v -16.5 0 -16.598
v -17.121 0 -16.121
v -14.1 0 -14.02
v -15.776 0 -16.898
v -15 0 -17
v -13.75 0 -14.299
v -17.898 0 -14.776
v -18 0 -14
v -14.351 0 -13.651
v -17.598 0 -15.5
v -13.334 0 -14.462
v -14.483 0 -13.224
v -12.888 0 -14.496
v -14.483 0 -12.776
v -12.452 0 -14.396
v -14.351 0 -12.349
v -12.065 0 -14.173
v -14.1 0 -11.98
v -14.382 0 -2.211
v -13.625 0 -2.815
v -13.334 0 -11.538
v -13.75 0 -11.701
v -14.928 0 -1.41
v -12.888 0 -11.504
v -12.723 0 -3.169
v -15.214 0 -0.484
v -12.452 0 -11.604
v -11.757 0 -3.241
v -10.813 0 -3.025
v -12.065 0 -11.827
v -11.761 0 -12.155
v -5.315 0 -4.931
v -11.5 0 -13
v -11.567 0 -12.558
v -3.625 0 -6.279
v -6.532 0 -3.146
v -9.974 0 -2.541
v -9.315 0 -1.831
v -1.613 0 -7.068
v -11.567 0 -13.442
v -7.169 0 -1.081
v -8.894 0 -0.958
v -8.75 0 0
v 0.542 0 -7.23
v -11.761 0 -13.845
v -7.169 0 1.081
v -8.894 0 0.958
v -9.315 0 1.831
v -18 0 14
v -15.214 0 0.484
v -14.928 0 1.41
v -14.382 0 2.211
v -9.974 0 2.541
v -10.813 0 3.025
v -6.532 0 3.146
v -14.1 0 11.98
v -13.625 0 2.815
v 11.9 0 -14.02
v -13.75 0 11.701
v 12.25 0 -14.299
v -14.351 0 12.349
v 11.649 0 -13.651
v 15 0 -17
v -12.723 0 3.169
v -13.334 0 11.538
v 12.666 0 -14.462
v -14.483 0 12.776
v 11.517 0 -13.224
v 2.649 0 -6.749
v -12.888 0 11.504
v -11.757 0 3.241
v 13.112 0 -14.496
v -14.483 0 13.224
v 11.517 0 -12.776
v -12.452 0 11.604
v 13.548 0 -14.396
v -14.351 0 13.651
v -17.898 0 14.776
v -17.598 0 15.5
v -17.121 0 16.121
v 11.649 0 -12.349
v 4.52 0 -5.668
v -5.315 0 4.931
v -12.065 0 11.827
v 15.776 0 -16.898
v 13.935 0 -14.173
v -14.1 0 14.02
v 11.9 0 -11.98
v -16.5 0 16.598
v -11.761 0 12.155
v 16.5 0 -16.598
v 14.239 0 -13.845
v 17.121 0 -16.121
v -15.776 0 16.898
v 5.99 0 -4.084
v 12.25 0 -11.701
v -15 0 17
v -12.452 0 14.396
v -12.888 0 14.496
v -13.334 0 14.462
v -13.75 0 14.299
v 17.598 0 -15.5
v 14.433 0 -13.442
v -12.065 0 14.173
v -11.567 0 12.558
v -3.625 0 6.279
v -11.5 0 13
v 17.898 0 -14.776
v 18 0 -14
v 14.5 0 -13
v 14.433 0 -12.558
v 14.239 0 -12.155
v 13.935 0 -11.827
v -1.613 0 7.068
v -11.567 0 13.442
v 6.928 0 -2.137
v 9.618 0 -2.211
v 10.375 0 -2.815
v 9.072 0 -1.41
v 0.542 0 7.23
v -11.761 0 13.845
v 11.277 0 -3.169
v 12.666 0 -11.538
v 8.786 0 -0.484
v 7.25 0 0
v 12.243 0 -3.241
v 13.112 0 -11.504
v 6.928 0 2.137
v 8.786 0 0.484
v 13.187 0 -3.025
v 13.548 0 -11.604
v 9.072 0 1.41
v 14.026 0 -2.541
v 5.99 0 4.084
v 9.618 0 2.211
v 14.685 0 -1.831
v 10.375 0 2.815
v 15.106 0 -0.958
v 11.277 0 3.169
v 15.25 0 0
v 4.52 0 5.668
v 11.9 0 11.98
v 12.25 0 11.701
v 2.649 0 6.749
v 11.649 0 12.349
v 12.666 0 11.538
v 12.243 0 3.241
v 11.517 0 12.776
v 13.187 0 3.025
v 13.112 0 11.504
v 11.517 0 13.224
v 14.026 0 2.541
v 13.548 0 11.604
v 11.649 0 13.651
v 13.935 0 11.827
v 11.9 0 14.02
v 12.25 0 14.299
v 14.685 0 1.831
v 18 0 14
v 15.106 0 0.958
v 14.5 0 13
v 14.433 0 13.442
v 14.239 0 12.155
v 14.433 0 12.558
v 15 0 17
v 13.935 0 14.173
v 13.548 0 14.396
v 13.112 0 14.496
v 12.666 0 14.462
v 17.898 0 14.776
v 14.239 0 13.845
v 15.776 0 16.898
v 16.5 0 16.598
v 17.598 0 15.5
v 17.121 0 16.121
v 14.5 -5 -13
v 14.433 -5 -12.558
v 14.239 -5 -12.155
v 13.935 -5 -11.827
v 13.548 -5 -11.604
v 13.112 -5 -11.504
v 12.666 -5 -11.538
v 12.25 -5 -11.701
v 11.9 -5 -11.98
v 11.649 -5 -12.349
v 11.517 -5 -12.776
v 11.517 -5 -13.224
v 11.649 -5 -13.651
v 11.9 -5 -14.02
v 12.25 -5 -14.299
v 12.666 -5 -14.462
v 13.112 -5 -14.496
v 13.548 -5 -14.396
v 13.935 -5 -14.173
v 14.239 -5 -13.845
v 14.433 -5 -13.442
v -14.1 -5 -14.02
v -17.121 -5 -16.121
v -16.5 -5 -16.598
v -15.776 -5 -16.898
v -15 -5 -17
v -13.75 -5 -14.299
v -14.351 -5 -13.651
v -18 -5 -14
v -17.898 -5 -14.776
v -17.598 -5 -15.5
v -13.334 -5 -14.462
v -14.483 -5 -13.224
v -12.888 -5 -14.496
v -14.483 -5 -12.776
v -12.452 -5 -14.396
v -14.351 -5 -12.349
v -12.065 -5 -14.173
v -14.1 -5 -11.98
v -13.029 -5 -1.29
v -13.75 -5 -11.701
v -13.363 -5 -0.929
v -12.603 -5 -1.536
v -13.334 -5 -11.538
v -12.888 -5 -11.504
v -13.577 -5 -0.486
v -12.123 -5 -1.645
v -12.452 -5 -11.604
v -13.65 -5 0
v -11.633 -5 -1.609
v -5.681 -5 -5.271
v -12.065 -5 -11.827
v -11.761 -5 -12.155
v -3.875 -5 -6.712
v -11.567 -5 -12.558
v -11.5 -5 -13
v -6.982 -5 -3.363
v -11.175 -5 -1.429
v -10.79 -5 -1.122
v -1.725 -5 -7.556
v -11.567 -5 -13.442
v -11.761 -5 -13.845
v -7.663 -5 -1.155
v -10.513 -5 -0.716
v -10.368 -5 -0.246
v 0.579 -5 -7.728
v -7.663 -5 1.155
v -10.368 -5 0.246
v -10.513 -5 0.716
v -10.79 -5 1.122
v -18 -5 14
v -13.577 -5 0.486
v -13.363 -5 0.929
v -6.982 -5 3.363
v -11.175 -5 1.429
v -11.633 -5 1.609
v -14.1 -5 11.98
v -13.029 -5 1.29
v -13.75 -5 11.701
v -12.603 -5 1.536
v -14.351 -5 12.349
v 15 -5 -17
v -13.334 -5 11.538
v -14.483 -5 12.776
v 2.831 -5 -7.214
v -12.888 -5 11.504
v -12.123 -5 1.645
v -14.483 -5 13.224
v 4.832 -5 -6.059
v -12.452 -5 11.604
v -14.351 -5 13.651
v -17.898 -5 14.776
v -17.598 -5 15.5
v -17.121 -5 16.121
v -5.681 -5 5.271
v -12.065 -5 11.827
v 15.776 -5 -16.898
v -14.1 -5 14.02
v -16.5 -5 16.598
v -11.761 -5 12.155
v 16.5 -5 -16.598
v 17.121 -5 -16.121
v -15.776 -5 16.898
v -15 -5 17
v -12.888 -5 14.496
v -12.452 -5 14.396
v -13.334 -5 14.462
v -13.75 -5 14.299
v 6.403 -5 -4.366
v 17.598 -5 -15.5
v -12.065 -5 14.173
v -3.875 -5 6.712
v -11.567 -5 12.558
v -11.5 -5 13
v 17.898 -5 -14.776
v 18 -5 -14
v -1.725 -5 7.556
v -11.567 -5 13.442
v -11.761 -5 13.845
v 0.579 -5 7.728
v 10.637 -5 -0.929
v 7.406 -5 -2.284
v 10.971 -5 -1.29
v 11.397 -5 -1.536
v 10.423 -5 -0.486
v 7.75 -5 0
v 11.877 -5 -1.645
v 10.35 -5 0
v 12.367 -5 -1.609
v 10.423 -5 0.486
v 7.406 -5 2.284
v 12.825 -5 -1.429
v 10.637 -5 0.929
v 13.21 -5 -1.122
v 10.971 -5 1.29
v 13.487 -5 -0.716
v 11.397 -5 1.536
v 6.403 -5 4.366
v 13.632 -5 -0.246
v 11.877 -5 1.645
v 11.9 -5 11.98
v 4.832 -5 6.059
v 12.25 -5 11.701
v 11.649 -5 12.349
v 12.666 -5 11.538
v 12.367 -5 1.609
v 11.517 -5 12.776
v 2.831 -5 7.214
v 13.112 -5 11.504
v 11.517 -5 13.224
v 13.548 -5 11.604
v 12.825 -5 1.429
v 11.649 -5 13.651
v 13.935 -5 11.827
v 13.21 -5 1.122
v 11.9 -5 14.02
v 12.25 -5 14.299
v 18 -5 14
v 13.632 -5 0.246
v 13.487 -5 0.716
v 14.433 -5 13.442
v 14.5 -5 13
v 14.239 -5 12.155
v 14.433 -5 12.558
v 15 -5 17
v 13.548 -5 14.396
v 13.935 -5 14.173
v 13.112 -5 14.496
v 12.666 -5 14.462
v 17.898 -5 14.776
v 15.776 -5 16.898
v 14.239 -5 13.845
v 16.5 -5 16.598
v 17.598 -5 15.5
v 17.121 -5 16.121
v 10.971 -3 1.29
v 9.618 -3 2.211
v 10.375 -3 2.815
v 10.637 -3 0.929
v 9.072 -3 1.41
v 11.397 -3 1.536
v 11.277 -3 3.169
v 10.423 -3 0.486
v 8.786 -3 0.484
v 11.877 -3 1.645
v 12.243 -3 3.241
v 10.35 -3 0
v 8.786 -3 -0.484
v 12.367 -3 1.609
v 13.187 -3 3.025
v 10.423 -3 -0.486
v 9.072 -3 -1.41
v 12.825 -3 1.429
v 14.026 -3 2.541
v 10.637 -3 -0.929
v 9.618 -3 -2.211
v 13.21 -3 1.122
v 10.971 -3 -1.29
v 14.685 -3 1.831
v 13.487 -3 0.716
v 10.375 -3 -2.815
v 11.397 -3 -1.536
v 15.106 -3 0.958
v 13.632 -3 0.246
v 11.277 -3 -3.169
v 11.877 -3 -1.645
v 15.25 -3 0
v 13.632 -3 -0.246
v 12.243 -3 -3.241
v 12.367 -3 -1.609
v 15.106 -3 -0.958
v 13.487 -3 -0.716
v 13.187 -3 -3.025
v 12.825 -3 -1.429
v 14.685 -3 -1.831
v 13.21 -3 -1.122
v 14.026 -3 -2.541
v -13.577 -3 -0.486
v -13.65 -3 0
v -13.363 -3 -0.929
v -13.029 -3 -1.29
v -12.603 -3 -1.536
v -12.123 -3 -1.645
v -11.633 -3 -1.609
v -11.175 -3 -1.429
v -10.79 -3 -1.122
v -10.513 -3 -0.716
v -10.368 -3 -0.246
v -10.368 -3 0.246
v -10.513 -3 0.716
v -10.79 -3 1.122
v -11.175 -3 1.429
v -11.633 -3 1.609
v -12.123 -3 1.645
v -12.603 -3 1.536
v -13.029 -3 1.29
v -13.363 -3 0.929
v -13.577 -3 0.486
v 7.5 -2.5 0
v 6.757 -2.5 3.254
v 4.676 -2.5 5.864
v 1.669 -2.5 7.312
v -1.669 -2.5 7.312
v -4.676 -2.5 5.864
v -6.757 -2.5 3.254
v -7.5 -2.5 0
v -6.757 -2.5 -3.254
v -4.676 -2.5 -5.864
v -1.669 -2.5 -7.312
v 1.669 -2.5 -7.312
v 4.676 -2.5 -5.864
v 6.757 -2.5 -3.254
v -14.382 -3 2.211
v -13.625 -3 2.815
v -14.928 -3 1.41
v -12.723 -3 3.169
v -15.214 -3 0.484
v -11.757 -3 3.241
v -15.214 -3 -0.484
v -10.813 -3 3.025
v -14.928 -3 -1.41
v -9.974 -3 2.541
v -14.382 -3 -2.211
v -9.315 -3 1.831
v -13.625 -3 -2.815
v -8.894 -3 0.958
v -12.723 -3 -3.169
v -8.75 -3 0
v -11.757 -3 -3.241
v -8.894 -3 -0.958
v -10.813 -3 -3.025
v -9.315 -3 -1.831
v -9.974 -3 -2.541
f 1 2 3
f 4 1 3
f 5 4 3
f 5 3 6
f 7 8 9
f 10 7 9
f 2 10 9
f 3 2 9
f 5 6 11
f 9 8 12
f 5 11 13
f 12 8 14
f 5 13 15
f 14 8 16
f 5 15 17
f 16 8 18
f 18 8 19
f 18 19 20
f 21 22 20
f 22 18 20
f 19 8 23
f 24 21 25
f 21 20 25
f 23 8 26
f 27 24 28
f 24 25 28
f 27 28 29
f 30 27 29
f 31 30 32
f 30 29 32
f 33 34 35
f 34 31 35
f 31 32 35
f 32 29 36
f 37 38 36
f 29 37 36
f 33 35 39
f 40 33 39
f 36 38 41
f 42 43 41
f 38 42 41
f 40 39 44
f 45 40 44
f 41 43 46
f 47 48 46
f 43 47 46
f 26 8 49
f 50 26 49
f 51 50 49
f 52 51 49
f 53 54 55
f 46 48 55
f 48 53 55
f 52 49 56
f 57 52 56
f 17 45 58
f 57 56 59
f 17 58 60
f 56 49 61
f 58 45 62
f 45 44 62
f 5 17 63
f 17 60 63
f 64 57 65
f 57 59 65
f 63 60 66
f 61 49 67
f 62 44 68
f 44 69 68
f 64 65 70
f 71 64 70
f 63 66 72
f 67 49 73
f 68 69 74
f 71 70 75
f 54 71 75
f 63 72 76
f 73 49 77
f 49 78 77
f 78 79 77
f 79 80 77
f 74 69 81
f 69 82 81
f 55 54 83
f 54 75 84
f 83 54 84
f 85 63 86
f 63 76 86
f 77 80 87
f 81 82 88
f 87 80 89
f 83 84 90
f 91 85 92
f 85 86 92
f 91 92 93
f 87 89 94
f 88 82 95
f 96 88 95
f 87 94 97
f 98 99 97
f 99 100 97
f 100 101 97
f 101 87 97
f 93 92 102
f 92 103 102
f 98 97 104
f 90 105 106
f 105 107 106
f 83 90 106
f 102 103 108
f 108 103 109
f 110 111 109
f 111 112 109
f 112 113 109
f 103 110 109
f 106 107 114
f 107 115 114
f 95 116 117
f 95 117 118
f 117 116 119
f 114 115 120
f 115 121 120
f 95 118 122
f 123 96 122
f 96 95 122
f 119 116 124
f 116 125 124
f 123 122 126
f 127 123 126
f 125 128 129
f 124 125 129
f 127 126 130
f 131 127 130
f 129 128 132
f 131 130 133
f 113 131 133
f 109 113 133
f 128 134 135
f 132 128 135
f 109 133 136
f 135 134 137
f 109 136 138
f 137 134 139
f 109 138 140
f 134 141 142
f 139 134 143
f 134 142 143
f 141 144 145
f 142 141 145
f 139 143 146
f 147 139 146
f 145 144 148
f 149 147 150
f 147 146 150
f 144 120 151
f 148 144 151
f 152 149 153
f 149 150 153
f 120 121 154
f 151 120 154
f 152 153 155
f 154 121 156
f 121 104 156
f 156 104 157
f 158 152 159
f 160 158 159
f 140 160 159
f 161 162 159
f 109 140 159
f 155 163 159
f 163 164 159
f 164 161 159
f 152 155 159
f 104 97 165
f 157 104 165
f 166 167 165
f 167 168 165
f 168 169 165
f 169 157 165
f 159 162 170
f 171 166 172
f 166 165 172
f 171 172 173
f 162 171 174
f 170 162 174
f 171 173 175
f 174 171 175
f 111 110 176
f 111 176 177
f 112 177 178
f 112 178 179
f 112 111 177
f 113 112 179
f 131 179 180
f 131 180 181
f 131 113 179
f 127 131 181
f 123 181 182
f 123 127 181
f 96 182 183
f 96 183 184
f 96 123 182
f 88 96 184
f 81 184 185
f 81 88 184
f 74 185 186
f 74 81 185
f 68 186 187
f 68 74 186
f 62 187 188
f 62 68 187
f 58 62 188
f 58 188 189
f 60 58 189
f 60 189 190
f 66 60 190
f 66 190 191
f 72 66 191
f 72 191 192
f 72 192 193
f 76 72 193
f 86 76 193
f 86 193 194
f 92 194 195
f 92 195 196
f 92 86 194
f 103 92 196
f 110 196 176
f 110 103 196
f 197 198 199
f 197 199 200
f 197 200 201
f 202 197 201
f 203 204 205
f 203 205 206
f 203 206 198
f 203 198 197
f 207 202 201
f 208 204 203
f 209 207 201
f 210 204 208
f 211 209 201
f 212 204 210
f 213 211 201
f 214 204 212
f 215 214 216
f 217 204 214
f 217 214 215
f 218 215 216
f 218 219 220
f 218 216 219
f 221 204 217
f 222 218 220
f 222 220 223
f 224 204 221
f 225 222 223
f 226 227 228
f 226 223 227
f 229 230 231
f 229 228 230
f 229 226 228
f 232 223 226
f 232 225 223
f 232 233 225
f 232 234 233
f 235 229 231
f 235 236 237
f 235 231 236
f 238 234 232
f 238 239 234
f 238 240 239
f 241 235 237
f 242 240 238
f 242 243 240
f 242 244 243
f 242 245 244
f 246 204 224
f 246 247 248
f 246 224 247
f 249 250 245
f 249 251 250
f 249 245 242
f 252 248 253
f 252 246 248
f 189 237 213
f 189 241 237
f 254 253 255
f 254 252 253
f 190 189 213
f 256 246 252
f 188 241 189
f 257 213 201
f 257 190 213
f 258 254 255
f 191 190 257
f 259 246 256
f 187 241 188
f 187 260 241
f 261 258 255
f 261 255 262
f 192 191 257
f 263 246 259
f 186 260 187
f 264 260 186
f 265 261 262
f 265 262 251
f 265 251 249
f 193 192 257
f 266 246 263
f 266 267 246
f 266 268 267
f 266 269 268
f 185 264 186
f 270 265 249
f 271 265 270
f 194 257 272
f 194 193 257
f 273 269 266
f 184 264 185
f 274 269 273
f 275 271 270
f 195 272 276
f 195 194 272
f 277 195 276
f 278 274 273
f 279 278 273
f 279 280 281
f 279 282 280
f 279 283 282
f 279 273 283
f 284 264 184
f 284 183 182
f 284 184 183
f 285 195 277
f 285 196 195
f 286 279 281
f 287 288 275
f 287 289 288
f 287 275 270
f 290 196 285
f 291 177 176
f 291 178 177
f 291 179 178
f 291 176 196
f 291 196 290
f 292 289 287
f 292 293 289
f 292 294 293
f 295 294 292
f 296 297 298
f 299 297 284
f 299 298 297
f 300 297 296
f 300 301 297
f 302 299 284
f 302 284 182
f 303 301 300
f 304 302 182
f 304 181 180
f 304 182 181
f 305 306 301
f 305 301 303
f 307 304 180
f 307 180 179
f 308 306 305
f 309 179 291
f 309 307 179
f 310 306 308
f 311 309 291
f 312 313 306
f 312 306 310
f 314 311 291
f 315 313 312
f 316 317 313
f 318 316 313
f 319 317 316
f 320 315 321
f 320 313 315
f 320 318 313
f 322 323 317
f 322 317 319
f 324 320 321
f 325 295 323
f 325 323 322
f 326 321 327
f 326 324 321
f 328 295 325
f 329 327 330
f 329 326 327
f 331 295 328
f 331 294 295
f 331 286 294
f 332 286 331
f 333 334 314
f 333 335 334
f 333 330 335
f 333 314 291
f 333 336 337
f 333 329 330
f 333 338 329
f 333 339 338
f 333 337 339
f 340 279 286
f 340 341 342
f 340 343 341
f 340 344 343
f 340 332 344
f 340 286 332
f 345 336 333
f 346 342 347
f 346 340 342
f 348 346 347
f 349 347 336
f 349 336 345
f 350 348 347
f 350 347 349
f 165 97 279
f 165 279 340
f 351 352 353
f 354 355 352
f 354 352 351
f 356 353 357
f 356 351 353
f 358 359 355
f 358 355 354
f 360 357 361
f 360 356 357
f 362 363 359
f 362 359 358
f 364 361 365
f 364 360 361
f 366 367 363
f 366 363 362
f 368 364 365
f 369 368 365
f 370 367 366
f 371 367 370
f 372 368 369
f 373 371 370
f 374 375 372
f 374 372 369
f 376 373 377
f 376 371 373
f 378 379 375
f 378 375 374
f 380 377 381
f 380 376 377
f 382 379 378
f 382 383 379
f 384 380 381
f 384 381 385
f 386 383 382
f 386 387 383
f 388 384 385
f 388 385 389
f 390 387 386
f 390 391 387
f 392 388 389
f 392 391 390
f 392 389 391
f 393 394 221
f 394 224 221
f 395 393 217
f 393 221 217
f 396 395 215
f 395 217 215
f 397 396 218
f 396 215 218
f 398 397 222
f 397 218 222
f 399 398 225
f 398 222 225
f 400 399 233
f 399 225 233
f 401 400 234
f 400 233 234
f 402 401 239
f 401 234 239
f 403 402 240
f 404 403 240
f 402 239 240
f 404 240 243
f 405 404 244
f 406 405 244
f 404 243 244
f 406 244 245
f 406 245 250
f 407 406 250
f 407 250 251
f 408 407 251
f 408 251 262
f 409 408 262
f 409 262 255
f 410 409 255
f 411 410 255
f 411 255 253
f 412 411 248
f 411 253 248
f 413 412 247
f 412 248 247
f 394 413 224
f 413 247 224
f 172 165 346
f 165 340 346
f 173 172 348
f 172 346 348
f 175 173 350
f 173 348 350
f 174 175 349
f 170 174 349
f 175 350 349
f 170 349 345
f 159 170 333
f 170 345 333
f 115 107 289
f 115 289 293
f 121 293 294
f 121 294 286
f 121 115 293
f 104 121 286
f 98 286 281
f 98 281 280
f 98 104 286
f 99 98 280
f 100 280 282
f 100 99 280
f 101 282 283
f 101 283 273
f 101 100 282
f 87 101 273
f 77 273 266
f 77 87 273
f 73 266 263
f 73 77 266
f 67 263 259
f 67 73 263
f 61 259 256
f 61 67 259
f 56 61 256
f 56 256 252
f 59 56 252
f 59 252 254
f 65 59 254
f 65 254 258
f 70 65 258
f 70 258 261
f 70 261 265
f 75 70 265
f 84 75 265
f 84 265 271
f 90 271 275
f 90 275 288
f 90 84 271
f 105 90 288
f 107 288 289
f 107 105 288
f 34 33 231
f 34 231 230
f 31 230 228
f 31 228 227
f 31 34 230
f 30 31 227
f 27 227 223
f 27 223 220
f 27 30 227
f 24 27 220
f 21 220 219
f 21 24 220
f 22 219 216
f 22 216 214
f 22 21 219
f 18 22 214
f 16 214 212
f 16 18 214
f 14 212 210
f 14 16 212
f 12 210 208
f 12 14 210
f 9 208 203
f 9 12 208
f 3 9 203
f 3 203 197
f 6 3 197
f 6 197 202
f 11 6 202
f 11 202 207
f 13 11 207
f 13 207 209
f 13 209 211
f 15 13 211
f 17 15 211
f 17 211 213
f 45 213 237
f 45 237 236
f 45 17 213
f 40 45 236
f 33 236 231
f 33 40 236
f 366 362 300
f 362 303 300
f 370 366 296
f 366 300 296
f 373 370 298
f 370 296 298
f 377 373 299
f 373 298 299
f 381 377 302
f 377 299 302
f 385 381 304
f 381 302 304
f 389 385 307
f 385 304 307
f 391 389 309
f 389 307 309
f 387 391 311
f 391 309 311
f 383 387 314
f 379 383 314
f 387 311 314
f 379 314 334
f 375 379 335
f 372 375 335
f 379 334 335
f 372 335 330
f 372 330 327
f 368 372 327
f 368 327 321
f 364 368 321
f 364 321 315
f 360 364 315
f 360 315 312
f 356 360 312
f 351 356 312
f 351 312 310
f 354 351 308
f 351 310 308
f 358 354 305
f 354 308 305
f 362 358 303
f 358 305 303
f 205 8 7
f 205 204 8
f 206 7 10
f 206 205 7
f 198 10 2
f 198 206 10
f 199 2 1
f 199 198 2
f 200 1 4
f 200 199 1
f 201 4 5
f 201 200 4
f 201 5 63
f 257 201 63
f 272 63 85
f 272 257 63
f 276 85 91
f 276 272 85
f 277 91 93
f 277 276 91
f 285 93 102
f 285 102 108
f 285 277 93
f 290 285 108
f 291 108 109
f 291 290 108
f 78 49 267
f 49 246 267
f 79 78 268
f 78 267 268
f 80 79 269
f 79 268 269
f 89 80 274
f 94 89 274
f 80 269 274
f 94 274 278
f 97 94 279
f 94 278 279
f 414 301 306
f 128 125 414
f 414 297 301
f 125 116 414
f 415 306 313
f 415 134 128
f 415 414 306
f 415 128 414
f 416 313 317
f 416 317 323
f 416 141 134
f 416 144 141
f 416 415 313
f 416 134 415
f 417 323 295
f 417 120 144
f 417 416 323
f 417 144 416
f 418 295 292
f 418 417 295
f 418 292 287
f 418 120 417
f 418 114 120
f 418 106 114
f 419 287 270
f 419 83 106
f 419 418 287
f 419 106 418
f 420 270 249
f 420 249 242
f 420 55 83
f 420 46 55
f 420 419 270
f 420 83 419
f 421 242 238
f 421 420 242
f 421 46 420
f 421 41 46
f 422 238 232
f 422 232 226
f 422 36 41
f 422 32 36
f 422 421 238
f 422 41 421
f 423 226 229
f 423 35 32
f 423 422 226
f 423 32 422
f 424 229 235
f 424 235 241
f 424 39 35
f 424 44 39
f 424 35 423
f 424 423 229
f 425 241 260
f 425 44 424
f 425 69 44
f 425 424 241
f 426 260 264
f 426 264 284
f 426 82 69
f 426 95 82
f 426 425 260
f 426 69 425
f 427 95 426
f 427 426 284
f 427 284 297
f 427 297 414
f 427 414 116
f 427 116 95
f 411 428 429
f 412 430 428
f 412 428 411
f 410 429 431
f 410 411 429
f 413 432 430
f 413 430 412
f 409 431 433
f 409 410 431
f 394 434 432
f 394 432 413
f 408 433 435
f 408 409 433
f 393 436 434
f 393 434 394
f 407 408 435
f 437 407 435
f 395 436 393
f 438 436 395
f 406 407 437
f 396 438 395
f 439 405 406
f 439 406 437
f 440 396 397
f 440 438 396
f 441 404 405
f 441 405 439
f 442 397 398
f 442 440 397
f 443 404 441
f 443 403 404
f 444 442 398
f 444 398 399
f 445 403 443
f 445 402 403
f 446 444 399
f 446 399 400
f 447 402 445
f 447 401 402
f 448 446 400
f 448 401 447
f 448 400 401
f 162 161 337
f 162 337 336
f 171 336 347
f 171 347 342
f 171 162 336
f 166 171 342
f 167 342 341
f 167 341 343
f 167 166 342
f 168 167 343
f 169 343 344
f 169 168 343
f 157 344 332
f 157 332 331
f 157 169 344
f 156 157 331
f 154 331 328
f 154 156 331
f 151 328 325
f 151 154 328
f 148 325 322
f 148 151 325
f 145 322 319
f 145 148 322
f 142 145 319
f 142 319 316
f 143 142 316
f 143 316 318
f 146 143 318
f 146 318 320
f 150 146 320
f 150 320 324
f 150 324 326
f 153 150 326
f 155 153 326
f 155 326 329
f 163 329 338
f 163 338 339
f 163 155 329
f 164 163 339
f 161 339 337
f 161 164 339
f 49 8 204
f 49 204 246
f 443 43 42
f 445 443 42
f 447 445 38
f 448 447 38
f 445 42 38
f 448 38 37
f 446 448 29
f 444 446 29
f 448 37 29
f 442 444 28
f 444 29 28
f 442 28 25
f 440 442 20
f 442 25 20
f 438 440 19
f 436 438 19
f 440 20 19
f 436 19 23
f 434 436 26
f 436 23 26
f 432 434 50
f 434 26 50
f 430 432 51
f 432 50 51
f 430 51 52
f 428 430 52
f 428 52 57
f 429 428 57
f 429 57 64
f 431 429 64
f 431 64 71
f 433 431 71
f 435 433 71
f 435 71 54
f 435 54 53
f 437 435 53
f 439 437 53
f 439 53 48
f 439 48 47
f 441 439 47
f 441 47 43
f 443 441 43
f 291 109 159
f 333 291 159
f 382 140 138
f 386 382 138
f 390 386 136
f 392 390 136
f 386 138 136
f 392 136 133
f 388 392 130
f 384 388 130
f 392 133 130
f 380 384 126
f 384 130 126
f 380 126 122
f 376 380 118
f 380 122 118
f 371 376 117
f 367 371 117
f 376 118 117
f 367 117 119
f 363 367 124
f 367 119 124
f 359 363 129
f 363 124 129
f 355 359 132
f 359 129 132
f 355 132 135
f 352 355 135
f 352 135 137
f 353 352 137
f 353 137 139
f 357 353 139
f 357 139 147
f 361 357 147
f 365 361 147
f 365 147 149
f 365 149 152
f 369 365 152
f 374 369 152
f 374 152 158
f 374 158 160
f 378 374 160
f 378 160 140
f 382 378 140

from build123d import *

# Parameters (mm, degrees)
F0_W           = 36
F0_H           = 34
F0_R           = 1.5
F0_R_2         = 7.25
F1_DEPTH       = 5
F2_R           = 3
F3_SIZE2       = 4.99999
F3_SIZE        = 0.49999
F4_D           = 3.3
F4_CBORE_D     = 6.5
F4_CBORE_DEPTH = 3


# Not quite as in the source:
# - a fillet or chamfer is up to 0.001 mm smaller than in the source, because OpenCascade refuses the exact size


with BuildPart() as f1:
    # F0 (on Front) → F1 (new body)
    with BuildSketch(Plane.XZ):
        Rectangle(F0_W, F0_H)
        with Locations((-13, -13)):
            Circle(F0_R, mode=Mode.SUBTRACT)
        with Locations((13, -13)):
            Circle(F0_R, mode=Mode.SUBTRACT)
        with Locations((-13, 13)):
            Circle(F0_R, mode=Mode.SUBTRACT)
        Circle(F0_R_2, mode=Mode.SUBTRACT)
        with Locations((13, 13)):
            Circle(F0_R, mode=Mode.SUBTRACT)
    extrude(amount=F1_DEPTH)

    # F2
    f2_edges = [f1.edges().sort_by_distance(p)[0] for p in [
        (-18, -2.5, 17),
        (18, -2.5, 17),
        (18, -2.5, -17),
        (-18, -2.5, -17),
    ]]
    fillet(f2_edges, radius=F2_R)

    # F3 (size 0.5 and 5 in the source; OpenCascade refuses exactly that, so slightly less here)
    f3_edges = [f1.edges().sort_by_distance(p)[0] for p in [
        (-7.25, -5, 0),
    ]]
    f3_side = f1.faces().sort_by_distance((0, -5, -16.504823))[0]
    chamfer(f3_edges, length=F3_SIZE, length2=F3_SIZE2, reference=f3_side)

    # F4 (through all)
    with Locations(Plane(origin=(0, 0, 0), x_dir=(1, 0, 0), z_dir=(0, 1, 0))):
        with Locations((12, 0), (-12, 0)):
            CounterBoreHole(F4_D / 2, F4_CBORE_D / 2, F4_CBORE_DEPTH)


solid = f1.part
